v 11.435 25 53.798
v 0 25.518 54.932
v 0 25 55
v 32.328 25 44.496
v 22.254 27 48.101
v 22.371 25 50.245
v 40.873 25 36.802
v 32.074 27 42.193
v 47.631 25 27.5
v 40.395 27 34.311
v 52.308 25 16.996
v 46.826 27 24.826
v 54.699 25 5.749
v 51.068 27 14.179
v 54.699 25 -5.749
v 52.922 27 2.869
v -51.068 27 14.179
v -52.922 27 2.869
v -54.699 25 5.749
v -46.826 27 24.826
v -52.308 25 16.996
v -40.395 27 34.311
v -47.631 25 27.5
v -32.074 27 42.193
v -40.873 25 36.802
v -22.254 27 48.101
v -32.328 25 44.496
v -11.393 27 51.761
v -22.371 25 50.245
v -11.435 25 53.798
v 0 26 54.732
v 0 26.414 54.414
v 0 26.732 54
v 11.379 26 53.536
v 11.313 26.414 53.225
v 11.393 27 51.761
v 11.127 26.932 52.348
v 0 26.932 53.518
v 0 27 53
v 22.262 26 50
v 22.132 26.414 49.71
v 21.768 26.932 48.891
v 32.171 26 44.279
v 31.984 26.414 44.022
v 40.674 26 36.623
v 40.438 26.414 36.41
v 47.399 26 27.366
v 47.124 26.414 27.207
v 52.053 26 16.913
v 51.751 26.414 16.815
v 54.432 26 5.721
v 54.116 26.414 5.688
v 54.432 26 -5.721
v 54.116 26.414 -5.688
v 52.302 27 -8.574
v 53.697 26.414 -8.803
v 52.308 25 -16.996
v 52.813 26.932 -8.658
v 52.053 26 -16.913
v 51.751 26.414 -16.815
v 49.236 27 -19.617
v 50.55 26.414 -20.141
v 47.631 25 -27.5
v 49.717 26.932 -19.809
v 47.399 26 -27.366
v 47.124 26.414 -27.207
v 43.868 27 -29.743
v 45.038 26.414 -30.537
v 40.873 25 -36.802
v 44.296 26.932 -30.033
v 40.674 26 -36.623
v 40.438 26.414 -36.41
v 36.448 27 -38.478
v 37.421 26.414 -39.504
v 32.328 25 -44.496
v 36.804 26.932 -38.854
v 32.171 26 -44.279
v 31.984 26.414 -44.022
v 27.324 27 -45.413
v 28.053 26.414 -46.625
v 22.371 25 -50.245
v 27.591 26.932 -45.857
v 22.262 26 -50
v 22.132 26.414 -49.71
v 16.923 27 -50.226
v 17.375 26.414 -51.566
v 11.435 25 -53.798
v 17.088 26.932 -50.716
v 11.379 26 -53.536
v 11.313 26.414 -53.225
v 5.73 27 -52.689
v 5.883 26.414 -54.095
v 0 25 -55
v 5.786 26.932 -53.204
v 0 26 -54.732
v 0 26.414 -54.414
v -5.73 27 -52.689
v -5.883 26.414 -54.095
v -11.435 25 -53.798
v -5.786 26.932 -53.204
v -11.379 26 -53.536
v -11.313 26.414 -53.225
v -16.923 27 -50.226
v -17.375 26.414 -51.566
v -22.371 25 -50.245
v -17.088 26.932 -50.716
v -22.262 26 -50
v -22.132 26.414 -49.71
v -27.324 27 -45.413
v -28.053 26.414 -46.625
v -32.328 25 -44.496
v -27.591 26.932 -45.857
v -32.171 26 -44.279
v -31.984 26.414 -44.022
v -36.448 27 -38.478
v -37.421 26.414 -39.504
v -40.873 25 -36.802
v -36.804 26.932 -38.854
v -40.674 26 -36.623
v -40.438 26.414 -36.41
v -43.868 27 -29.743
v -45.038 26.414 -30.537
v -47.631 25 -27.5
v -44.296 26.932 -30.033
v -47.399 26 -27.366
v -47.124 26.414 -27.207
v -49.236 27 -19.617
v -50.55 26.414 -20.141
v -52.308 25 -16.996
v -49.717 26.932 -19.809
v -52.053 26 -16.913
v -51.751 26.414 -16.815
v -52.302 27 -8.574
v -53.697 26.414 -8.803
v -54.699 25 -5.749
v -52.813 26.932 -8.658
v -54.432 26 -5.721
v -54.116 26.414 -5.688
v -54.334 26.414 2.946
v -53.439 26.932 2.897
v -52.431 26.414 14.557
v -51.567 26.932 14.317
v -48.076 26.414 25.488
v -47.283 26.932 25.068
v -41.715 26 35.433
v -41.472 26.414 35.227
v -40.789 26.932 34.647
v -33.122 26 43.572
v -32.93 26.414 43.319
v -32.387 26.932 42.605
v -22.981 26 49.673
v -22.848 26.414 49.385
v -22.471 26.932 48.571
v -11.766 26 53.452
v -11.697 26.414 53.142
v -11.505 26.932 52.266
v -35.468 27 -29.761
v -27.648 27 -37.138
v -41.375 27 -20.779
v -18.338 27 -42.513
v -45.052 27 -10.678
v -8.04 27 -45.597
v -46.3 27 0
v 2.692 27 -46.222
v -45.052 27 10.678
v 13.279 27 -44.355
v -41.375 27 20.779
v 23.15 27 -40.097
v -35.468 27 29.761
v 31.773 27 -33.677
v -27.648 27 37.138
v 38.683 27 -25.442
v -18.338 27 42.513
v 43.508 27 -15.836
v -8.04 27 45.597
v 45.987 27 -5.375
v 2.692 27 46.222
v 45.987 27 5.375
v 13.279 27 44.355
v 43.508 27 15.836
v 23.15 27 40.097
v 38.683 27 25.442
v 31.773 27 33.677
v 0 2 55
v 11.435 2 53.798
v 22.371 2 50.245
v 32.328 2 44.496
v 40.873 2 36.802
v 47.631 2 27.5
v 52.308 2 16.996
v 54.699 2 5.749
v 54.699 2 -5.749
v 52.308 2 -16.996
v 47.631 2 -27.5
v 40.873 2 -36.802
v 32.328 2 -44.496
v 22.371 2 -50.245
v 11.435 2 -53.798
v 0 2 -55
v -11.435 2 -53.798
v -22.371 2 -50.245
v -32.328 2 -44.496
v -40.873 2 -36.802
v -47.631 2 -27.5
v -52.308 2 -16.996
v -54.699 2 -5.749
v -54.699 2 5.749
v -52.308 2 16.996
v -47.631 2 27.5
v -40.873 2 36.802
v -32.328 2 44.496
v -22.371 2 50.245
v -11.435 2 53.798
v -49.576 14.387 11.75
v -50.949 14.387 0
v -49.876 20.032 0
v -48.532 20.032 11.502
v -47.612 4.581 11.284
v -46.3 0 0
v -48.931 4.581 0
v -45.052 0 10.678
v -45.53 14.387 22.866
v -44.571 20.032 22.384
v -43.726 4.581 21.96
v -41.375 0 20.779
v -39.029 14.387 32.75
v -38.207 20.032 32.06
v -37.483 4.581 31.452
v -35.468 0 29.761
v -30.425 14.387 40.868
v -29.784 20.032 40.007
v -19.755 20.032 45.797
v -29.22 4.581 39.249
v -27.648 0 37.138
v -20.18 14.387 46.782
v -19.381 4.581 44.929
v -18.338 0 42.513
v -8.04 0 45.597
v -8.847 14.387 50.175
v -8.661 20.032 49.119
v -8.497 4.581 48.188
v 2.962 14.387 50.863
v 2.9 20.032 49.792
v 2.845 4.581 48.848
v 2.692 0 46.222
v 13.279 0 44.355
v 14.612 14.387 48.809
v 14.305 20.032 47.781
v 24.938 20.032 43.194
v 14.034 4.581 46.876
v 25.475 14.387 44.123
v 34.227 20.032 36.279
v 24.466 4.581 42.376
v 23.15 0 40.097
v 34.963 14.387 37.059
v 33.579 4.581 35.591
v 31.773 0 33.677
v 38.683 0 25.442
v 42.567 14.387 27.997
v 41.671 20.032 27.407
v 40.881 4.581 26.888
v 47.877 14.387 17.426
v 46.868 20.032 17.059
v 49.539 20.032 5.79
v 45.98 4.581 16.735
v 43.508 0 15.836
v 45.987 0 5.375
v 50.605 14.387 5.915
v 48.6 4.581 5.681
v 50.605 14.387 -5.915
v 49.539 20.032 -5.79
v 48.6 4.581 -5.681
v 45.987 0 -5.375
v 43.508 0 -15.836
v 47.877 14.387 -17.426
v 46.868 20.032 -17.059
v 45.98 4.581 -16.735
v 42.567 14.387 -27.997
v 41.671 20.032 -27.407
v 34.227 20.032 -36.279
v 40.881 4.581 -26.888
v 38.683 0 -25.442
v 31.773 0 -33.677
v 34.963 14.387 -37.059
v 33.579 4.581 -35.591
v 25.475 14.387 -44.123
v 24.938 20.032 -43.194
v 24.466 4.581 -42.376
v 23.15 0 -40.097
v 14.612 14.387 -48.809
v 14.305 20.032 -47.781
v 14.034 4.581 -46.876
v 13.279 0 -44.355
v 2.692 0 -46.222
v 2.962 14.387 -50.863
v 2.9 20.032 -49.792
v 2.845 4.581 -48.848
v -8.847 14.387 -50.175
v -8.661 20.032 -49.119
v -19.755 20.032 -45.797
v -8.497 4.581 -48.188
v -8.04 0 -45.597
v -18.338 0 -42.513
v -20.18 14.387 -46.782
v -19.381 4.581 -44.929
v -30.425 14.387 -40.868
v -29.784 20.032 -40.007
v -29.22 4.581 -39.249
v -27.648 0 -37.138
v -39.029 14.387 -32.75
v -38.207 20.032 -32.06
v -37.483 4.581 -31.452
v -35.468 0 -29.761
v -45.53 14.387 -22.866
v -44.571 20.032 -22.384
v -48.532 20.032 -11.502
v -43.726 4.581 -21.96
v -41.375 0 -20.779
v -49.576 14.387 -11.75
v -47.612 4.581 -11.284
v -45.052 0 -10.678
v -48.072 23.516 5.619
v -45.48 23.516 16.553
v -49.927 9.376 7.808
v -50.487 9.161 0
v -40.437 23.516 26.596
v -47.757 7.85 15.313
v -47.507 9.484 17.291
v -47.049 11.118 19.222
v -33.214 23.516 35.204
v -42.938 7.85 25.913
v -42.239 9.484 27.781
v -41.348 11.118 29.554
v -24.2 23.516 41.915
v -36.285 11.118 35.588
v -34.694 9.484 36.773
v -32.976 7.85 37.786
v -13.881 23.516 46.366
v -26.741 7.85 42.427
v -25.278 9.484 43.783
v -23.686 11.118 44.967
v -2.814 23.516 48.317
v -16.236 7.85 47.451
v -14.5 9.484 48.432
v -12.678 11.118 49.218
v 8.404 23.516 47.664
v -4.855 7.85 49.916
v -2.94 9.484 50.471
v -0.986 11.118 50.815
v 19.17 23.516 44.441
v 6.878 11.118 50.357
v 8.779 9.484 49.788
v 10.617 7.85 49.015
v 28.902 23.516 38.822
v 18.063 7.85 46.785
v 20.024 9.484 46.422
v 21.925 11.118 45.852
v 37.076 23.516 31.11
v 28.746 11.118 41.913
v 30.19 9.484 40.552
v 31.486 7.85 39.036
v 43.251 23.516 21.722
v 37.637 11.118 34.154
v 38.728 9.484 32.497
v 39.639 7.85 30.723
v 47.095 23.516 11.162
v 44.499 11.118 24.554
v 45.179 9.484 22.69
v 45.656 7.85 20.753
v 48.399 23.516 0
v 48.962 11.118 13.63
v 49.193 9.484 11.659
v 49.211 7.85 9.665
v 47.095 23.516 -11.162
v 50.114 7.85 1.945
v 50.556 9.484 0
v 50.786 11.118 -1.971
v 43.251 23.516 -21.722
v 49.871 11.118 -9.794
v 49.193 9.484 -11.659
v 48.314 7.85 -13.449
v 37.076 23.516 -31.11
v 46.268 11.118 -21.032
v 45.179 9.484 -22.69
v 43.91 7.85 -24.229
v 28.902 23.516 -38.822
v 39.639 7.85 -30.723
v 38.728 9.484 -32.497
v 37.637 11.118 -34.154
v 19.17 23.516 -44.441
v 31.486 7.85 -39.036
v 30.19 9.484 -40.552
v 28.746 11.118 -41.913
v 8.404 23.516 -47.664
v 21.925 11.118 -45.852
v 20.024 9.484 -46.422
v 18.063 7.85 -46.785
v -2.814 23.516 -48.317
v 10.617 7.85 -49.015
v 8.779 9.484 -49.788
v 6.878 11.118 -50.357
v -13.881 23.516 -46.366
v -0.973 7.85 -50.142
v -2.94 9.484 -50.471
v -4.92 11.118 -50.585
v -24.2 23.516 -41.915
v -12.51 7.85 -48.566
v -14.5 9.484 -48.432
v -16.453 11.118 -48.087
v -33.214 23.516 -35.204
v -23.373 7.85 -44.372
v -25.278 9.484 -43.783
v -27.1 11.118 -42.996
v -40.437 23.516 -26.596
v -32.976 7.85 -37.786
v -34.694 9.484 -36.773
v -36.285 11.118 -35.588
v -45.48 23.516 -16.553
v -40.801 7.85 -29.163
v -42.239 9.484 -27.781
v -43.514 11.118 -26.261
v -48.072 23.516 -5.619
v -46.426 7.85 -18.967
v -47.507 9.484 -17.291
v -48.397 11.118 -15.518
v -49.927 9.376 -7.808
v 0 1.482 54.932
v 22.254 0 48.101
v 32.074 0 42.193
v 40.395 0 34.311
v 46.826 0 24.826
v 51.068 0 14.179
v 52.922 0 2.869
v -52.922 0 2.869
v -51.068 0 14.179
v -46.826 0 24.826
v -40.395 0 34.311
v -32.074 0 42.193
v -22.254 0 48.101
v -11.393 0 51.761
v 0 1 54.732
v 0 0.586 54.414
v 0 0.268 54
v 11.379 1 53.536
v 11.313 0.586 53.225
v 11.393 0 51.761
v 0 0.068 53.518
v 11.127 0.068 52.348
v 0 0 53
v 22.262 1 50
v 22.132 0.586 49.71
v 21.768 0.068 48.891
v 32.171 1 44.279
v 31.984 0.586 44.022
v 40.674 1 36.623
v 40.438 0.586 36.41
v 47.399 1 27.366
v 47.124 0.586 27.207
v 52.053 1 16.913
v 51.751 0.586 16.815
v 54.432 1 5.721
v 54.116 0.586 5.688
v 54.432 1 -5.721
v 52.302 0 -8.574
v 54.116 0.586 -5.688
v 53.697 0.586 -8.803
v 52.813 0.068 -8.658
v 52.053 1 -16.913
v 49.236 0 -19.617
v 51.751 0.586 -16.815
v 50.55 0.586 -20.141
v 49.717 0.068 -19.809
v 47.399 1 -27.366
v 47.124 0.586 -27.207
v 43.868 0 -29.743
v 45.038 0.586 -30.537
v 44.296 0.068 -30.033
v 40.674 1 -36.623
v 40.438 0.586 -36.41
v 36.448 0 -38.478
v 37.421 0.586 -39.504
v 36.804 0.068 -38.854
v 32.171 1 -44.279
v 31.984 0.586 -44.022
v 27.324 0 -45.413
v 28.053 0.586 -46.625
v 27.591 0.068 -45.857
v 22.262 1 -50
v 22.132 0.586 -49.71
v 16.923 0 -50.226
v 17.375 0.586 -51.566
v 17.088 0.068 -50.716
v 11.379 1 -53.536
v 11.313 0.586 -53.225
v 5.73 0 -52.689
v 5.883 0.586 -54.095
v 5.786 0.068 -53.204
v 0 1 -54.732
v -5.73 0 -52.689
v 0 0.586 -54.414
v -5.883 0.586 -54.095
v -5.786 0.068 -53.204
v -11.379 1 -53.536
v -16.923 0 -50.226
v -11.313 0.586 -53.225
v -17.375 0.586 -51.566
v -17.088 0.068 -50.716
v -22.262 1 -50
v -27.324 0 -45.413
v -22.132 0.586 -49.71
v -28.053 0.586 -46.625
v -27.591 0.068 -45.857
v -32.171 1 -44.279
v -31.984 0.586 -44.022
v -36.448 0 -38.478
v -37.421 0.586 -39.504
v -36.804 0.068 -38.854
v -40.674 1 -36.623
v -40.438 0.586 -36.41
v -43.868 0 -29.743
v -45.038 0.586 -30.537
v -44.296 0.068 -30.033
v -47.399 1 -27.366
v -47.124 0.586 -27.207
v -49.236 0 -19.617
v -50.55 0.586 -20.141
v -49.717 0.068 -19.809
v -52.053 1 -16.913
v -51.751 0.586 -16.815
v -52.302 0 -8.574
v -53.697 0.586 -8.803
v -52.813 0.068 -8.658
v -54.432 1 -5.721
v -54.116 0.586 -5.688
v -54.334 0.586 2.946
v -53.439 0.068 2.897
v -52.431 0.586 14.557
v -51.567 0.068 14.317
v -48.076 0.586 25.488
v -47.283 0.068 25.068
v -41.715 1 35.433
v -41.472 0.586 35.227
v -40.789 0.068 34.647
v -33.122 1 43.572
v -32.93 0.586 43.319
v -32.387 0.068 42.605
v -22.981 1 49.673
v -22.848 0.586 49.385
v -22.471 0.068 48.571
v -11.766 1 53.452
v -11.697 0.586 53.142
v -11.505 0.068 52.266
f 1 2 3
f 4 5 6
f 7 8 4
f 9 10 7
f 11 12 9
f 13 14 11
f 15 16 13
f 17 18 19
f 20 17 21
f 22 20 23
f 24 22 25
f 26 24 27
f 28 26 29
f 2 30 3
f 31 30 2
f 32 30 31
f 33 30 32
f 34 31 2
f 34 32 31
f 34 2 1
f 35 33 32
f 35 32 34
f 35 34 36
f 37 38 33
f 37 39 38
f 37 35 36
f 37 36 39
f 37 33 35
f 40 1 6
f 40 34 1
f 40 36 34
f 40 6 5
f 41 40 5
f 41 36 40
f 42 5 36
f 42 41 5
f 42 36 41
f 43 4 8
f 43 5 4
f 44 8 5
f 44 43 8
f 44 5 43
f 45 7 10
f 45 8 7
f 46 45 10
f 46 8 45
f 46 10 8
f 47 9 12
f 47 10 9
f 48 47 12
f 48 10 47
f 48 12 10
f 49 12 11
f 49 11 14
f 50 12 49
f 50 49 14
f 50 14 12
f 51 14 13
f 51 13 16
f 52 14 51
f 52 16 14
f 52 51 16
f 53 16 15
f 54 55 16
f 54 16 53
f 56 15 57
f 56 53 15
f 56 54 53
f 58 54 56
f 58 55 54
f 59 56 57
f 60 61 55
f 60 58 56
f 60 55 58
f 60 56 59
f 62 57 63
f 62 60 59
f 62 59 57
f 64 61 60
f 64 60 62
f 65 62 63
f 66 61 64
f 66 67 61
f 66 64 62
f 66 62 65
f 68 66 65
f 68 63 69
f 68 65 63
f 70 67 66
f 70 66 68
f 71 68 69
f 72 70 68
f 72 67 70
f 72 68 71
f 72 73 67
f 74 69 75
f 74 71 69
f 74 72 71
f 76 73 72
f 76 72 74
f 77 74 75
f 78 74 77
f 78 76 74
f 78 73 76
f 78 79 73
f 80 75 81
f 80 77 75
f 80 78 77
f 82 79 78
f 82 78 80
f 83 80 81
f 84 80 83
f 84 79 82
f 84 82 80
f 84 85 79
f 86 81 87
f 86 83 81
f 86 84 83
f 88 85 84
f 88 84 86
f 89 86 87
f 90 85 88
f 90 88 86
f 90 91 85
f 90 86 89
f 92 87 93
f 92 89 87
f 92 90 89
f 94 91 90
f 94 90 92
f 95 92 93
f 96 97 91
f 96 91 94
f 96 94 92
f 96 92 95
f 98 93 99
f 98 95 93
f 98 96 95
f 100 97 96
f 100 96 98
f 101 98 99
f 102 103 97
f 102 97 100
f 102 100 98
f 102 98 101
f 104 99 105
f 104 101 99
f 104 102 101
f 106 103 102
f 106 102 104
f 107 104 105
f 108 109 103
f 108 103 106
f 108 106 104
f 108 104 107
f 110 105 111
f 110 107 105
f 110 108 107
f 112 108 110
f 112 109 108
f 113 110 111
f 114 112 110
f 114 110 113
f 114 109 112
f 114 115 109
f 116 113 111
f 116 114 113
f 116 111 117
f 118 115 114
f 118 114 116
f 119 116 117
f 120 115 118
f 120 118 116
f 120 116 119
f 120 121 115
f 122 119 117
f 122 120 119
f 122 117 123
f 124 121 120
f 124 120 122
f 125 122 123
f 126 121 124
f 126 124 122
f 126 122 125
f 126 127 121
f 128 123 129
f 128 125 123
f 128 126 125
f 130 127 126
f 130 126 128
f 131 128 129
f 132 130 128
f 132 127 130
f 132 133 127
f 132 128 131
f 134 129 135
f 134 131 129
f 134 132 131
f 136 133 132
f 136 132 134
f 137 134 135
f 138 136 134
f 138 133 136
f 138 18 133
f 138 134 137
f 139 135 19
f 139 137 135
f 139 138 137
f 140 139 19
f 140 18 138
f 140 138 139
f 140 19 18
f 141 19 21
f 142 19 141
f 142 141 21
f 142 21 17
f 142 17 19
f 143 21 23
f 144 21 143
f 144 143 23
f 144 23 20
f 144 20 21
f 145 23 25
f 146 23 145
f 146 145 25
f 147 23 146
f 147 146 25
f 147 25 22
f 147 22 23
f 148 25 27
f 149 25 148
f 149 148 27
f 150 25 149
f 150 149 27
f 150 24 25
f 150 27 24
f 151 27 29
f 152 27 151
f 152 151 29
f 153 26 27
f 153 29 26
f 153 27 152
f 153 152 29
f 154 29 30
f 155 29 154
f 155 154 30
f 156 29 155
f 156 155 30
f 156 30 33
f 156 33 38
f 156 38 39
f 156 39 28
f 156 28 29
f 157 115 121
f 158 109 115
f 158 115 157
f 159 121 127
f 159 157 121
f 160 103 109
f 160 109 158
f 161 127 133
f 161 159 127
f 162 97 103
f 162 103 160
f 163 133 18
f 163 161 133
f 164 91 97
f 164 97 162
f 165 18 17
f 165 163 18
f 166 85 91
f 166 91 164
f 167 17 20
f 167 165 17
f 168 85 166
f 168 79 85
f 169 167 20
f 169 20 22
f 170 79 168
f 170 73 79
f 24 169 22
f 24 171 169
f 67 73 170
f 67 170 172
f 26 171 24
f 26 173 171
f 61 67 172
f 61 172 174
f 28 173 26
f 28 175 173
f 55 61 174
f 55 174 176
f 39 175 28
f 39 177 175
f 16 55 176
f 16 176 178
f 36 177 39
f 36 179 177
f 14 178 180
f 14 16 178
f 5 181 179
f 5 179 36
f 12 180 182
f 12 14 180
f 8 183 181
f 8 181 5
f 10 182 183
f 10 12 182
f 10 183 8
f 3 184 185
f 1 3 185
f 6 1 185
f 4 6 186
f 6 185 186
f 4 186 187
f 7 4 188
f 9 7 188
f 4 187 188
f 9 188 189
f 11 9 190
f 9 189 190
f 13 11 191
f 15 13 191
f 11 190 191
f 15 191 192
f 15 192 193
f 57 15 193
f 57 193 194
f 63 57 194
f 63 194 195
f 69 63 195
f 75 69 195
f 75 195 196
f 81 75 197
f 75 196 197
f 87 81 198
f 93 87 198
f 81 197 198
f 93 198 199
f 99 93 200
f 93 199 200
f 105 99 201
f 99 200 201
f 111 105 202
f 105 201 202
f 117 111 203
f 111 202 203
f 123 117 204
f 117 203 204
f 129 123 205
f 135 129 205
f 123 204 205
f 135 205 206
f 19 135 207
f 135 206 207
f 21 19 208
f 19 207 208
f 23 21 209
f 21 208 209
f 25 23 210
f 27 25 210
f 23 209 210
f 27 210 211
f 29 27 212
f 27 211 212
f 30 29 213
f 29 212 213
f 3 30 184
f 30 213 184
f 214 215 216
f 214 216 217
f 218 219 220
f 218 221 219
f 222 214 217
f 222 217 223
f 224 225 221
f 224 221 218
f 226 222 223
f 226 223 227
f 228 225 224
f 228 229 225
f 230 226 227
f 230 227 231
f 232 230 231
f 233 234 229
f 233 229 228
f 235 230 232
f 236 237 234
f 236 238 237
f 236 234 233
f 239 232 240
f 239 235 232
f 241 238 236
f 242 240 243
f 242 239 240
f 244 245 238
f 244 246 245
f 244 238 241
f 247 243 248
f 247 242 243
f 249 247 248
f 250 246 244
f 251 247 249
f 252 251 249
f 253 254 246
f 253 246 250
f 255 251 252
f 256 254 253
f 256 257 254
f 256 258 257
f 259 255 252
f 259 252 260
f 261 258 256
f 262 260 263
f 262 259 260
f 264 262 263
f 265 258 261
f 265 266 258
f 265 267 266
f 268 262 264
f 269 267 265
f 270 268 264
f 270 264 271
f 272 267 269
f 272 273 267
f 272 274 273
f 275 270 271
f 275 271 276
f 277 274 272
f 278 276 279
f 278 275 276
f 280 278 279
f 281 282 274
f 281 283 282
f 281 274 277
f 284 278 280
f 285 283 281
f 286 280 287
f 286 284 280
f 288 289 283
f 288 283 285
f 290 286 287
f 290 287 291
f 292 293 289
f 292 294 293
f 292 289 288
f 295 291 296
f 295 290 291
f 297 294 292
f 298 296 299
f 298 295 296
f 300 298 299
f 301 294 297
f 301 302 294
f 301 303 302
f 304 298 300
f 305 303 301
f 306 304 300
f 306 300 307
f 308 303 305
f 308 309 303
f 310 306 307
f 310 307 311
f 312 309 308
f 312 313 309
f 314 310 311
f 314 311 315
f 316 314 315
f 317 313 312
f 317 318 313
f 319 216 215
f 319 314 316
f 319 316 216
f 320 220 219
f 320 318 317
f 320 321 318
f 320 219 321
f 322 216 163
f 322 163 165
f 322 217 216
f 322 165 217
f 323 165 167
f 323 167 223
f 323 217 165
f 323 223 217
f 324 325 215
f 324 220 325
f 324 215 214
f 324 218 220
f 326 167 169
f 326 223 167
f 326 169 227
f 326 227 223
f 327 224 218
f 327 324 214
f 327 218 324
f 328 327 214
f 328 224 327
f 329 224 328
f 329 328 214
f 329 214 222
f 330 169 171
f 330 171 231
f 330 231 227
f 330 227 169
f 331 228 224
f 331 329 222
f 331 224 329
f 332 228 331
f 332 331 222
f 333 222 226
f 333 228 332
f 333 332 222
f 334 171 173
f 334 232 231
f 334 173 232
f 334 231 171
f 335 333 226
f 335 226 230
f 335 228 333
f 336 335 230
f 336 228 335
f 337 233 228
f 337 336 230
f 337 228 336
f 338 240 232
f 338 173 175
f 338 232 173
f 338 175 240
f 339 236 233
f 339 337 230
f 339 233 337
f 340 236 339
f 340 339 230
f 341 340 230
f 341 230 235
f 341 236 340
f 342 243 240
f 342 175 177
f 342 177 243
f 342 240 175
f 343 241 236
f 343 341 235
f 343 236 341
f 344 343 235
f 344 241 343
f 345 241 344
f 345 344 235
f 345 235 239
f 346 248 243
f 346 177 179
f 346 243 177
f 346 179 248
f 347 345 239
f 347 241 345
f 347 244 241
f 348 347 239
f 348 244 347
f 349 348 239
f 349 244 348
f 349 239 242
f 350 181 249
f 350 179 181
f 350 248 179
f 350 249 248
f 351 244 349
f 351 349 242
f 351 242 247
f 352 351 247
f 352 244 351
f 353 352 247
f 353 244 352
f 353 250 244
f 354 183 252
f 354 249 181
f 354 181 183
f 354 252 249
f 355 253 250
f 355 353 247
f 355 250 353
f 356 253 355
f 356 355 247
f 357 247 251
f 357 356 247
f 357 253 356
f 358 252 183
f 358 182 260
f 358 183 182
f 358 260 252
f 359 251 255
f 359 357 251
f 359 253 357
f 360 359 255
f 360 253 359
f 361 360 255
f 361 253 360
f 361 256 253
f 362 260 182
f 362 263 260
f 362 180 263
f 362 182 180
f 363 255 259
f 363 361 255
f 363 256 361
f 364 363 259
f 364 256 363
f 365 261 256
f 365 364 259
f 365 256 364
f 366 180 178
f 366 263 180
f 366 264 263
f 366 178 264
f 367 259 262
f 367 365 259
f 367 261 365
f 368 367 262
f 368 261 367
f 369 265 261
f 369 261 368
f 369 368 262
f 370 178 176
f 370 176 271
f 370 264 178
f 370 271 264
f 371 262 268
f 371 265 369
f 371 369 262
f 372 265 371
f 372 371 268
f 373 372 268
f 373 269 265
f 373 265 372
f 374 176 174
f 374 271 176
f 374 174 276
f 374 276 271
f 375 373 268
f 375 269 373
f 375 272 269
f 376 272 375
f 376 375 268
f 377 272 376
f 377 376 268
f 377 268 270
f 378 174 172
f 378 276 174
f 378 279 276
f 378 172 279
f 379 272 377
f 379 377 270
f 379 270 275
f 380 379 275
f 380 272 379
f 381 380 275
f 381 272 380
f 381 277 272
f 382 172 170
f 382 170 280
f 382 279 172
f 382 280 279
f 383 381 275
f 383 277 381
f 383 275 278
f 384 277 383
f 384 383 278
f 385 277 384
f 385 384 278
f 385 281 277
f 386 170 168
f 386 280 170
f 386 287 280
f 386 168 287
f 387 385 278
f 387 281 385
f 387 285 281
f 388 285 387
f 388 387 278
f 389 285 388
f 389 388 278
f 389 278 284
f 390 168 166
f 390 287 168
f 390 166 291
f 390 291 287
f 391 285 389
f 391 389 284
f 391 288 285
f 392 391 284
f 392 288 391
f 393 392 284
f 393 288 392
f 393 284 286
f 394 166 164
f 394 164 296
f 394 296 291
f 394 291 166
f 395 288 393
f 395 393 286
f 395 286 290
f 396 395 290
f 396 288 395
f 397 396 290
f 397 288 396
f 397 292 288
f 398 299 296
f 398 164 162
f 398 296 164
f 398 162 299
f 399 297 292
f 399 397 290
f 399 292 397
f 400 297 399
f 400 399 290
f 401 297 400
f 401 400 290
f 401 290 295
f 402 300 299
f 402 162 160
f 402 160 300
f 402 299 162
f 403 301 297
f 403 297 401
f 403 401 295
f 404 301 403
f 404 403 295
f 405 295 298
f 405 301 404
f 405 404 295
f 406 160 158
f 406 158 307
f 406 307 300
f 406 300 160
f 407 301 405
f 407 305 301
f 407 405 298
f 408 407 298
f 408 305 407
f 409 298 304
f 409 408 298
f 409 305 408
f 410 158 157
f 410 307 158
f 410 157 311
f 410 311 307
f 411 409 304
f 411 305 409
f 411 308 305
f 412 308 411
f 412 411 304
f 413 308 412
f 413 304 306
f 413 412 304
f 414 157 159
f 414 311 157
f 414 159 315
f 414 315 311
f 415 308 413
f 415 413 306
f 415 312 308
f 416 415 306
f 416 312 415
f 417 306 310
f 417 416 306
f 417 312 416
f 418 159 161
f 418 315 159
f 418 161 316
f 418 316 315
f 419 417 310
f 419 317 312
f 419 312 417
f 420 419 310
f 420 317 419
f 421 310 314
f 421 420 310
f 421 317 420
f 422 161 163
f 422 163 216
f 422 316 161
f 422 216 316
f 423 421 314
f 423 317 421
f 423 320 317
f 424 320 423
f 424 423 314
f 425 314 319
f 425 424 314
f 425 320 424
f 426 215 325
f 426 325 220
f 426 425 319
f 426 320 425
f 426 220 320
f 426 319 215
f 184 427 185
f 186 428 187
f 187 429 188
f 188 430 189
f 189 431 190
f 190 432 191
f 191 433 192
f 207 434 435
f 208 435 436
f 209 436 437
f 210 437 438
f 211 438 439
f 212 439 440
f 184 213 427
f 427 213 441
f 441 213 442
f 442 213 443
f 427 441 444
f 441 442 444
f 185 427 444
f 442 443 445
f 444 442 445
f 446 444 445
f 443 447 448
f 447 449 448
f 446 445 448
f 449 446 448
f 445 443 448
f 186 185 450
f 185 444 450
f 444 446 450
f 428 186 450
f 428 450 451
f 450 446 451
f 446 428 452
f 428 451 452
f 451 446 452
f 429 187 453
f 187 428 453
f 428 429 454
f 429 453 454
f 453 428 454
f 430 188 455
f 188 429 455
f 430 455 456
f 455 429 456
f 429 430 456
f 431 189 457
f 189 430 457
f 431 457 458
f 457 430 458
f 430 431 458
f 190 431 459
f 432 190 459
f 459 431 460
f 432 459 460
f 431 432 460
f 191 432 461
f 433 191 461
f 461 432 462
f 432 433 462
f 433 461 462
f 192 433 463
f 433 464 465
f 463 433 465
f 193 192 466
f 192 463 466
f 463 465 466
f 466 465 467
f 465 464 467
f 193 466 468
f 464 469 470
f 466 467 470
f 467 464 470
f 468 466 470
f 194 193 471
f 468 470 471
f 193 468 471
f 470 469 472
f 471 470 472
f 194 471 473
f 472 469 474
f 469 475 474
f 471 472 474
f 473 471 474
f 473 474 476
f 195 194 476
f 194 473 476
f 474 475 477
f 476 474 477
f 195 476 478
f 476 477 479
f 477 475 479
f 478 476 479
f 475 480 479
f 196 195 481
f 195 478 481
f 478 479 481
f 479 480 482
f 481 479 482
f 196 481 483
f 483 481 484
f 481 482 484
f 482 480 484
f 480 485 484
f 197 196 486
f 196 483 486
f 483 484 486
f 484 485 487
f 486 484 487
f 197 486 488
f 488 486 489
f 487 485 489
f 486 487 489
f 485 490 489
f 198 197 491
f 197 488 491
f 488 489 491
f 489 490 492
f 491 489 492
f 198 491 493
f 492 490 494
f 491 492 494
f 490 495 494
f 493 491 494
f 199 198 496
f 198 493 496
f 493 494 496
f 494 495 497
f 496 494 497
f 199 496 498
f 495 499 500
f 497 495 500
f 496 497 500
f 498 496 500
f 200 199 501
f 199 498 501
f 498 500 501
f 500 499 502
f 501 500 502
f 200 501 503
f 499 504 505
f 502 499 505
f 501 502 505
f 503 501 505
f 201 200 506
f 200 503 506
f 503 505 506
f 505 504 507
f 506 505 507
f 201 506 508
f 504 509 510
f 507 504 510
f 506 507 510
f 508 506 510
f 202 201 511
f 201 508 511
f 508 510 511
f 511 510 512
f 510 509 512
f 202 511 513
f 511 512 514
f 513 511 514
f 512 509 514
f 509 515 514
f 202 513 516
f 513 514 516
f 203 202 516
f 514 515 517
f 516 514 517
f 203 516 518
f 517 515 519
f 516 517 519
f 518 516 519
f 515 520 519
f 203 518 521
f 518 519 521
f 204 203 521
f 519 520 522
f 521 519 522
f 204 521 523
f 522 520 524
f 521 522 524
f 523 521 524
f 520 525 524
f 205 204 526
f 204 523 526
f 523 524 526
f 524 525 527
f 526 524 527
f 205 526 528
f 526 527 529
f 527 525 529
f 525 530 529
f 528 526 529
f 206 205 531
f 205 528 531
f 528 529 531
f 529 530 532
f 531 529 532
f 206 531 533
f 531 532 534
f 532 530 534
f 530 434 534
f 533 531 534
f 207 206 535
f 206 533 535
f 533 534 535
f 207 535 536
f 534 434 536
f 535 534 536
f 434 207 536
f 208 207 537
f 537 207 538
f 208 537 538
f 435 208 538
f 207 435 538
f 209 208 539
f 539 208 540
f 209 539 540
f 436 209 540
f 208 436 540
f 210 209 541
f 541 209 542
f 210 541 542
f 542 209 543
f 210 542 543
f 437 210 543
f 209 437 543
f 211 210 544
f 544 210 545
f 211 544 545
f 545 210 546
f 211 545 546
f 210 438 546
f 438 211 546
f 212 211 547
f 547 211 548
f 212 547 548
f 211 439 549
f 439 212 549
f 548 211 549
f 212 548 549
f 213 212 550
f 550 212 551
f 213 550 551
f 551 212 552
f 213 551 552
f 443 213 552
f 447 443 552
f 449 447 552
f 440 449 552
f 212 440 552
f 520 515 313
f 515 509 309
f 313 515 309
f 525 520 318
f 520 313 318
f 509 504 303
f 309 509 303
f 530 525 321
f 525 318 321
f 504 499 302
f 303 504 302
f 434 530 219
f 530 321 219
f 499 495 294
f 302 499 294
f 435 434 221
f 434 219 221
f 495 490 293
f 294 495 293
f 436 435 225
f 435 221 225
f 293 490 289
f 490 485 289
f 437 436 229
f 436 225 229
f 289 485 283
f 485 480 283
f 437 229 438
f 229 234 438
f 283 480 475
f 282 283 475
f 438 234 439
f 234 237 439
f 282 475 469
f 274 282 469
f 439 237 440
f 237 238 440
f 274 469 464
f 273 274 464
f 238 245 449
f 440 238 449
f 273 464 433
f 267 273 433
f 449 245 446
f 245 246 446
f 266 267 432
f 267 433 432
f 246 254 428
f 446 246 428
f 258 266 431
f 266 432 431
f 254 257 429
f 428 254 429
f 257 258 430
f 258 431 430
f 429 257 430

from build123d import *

# Parameters (mm, degrees)
SKETCH1_R           = 55
SKETCH1_R_2         = 46.3
BOSS_EXTRUDE1_DEPTH = 27
FILLET1_R           = 2


with BuildPart() as part:
    # Sketch1 → Boss-Extrude1 (new body)
    with BuildSketch(Plane(origin=(0, 0, 0), x_dir=(1, 0, 0), z_dir=(0, 1, 0))):
        with Locations(Location((0, 0, 0), (0, 0, 270))):
            Circle(SKETCH1_R)
        with Locations(Location((0, 0, 0), (0, 0, 270))):
            Circle(SKETCH1_R_2, mode=Mode.SUBTRACT)
    extrude(amount=BOSS_EXTRUDE1_DEPTH)

    # Fillet1
    fillet1_edges = [part.edges().sort_by_distance(p)[0] for p in [
        (0, 0, -55),
        (0, 27, -55),
    ]]
    fillet(fillet1_edges, radius=FILLET1_R)

    # Sketch2 → Cut-Revolve1 (revolve, cut)
    with BuildSketch(Plane.XY):
        with BuildLine():
            Line((-46.3, 27), (-46.3, 0))
            add(Edge.make_bspline(
                [(-46.3, 27), (-55.638814742, 13.5), (-46.3, 0)],
                knots=[0, 0, 0, 1, 1, 1], degree=2))
        make_face()
    revolve(axis=Axis((0, 0, 0), (0, 1, 0)), mode=Mode.SUBTRACT)


solid = part.part
